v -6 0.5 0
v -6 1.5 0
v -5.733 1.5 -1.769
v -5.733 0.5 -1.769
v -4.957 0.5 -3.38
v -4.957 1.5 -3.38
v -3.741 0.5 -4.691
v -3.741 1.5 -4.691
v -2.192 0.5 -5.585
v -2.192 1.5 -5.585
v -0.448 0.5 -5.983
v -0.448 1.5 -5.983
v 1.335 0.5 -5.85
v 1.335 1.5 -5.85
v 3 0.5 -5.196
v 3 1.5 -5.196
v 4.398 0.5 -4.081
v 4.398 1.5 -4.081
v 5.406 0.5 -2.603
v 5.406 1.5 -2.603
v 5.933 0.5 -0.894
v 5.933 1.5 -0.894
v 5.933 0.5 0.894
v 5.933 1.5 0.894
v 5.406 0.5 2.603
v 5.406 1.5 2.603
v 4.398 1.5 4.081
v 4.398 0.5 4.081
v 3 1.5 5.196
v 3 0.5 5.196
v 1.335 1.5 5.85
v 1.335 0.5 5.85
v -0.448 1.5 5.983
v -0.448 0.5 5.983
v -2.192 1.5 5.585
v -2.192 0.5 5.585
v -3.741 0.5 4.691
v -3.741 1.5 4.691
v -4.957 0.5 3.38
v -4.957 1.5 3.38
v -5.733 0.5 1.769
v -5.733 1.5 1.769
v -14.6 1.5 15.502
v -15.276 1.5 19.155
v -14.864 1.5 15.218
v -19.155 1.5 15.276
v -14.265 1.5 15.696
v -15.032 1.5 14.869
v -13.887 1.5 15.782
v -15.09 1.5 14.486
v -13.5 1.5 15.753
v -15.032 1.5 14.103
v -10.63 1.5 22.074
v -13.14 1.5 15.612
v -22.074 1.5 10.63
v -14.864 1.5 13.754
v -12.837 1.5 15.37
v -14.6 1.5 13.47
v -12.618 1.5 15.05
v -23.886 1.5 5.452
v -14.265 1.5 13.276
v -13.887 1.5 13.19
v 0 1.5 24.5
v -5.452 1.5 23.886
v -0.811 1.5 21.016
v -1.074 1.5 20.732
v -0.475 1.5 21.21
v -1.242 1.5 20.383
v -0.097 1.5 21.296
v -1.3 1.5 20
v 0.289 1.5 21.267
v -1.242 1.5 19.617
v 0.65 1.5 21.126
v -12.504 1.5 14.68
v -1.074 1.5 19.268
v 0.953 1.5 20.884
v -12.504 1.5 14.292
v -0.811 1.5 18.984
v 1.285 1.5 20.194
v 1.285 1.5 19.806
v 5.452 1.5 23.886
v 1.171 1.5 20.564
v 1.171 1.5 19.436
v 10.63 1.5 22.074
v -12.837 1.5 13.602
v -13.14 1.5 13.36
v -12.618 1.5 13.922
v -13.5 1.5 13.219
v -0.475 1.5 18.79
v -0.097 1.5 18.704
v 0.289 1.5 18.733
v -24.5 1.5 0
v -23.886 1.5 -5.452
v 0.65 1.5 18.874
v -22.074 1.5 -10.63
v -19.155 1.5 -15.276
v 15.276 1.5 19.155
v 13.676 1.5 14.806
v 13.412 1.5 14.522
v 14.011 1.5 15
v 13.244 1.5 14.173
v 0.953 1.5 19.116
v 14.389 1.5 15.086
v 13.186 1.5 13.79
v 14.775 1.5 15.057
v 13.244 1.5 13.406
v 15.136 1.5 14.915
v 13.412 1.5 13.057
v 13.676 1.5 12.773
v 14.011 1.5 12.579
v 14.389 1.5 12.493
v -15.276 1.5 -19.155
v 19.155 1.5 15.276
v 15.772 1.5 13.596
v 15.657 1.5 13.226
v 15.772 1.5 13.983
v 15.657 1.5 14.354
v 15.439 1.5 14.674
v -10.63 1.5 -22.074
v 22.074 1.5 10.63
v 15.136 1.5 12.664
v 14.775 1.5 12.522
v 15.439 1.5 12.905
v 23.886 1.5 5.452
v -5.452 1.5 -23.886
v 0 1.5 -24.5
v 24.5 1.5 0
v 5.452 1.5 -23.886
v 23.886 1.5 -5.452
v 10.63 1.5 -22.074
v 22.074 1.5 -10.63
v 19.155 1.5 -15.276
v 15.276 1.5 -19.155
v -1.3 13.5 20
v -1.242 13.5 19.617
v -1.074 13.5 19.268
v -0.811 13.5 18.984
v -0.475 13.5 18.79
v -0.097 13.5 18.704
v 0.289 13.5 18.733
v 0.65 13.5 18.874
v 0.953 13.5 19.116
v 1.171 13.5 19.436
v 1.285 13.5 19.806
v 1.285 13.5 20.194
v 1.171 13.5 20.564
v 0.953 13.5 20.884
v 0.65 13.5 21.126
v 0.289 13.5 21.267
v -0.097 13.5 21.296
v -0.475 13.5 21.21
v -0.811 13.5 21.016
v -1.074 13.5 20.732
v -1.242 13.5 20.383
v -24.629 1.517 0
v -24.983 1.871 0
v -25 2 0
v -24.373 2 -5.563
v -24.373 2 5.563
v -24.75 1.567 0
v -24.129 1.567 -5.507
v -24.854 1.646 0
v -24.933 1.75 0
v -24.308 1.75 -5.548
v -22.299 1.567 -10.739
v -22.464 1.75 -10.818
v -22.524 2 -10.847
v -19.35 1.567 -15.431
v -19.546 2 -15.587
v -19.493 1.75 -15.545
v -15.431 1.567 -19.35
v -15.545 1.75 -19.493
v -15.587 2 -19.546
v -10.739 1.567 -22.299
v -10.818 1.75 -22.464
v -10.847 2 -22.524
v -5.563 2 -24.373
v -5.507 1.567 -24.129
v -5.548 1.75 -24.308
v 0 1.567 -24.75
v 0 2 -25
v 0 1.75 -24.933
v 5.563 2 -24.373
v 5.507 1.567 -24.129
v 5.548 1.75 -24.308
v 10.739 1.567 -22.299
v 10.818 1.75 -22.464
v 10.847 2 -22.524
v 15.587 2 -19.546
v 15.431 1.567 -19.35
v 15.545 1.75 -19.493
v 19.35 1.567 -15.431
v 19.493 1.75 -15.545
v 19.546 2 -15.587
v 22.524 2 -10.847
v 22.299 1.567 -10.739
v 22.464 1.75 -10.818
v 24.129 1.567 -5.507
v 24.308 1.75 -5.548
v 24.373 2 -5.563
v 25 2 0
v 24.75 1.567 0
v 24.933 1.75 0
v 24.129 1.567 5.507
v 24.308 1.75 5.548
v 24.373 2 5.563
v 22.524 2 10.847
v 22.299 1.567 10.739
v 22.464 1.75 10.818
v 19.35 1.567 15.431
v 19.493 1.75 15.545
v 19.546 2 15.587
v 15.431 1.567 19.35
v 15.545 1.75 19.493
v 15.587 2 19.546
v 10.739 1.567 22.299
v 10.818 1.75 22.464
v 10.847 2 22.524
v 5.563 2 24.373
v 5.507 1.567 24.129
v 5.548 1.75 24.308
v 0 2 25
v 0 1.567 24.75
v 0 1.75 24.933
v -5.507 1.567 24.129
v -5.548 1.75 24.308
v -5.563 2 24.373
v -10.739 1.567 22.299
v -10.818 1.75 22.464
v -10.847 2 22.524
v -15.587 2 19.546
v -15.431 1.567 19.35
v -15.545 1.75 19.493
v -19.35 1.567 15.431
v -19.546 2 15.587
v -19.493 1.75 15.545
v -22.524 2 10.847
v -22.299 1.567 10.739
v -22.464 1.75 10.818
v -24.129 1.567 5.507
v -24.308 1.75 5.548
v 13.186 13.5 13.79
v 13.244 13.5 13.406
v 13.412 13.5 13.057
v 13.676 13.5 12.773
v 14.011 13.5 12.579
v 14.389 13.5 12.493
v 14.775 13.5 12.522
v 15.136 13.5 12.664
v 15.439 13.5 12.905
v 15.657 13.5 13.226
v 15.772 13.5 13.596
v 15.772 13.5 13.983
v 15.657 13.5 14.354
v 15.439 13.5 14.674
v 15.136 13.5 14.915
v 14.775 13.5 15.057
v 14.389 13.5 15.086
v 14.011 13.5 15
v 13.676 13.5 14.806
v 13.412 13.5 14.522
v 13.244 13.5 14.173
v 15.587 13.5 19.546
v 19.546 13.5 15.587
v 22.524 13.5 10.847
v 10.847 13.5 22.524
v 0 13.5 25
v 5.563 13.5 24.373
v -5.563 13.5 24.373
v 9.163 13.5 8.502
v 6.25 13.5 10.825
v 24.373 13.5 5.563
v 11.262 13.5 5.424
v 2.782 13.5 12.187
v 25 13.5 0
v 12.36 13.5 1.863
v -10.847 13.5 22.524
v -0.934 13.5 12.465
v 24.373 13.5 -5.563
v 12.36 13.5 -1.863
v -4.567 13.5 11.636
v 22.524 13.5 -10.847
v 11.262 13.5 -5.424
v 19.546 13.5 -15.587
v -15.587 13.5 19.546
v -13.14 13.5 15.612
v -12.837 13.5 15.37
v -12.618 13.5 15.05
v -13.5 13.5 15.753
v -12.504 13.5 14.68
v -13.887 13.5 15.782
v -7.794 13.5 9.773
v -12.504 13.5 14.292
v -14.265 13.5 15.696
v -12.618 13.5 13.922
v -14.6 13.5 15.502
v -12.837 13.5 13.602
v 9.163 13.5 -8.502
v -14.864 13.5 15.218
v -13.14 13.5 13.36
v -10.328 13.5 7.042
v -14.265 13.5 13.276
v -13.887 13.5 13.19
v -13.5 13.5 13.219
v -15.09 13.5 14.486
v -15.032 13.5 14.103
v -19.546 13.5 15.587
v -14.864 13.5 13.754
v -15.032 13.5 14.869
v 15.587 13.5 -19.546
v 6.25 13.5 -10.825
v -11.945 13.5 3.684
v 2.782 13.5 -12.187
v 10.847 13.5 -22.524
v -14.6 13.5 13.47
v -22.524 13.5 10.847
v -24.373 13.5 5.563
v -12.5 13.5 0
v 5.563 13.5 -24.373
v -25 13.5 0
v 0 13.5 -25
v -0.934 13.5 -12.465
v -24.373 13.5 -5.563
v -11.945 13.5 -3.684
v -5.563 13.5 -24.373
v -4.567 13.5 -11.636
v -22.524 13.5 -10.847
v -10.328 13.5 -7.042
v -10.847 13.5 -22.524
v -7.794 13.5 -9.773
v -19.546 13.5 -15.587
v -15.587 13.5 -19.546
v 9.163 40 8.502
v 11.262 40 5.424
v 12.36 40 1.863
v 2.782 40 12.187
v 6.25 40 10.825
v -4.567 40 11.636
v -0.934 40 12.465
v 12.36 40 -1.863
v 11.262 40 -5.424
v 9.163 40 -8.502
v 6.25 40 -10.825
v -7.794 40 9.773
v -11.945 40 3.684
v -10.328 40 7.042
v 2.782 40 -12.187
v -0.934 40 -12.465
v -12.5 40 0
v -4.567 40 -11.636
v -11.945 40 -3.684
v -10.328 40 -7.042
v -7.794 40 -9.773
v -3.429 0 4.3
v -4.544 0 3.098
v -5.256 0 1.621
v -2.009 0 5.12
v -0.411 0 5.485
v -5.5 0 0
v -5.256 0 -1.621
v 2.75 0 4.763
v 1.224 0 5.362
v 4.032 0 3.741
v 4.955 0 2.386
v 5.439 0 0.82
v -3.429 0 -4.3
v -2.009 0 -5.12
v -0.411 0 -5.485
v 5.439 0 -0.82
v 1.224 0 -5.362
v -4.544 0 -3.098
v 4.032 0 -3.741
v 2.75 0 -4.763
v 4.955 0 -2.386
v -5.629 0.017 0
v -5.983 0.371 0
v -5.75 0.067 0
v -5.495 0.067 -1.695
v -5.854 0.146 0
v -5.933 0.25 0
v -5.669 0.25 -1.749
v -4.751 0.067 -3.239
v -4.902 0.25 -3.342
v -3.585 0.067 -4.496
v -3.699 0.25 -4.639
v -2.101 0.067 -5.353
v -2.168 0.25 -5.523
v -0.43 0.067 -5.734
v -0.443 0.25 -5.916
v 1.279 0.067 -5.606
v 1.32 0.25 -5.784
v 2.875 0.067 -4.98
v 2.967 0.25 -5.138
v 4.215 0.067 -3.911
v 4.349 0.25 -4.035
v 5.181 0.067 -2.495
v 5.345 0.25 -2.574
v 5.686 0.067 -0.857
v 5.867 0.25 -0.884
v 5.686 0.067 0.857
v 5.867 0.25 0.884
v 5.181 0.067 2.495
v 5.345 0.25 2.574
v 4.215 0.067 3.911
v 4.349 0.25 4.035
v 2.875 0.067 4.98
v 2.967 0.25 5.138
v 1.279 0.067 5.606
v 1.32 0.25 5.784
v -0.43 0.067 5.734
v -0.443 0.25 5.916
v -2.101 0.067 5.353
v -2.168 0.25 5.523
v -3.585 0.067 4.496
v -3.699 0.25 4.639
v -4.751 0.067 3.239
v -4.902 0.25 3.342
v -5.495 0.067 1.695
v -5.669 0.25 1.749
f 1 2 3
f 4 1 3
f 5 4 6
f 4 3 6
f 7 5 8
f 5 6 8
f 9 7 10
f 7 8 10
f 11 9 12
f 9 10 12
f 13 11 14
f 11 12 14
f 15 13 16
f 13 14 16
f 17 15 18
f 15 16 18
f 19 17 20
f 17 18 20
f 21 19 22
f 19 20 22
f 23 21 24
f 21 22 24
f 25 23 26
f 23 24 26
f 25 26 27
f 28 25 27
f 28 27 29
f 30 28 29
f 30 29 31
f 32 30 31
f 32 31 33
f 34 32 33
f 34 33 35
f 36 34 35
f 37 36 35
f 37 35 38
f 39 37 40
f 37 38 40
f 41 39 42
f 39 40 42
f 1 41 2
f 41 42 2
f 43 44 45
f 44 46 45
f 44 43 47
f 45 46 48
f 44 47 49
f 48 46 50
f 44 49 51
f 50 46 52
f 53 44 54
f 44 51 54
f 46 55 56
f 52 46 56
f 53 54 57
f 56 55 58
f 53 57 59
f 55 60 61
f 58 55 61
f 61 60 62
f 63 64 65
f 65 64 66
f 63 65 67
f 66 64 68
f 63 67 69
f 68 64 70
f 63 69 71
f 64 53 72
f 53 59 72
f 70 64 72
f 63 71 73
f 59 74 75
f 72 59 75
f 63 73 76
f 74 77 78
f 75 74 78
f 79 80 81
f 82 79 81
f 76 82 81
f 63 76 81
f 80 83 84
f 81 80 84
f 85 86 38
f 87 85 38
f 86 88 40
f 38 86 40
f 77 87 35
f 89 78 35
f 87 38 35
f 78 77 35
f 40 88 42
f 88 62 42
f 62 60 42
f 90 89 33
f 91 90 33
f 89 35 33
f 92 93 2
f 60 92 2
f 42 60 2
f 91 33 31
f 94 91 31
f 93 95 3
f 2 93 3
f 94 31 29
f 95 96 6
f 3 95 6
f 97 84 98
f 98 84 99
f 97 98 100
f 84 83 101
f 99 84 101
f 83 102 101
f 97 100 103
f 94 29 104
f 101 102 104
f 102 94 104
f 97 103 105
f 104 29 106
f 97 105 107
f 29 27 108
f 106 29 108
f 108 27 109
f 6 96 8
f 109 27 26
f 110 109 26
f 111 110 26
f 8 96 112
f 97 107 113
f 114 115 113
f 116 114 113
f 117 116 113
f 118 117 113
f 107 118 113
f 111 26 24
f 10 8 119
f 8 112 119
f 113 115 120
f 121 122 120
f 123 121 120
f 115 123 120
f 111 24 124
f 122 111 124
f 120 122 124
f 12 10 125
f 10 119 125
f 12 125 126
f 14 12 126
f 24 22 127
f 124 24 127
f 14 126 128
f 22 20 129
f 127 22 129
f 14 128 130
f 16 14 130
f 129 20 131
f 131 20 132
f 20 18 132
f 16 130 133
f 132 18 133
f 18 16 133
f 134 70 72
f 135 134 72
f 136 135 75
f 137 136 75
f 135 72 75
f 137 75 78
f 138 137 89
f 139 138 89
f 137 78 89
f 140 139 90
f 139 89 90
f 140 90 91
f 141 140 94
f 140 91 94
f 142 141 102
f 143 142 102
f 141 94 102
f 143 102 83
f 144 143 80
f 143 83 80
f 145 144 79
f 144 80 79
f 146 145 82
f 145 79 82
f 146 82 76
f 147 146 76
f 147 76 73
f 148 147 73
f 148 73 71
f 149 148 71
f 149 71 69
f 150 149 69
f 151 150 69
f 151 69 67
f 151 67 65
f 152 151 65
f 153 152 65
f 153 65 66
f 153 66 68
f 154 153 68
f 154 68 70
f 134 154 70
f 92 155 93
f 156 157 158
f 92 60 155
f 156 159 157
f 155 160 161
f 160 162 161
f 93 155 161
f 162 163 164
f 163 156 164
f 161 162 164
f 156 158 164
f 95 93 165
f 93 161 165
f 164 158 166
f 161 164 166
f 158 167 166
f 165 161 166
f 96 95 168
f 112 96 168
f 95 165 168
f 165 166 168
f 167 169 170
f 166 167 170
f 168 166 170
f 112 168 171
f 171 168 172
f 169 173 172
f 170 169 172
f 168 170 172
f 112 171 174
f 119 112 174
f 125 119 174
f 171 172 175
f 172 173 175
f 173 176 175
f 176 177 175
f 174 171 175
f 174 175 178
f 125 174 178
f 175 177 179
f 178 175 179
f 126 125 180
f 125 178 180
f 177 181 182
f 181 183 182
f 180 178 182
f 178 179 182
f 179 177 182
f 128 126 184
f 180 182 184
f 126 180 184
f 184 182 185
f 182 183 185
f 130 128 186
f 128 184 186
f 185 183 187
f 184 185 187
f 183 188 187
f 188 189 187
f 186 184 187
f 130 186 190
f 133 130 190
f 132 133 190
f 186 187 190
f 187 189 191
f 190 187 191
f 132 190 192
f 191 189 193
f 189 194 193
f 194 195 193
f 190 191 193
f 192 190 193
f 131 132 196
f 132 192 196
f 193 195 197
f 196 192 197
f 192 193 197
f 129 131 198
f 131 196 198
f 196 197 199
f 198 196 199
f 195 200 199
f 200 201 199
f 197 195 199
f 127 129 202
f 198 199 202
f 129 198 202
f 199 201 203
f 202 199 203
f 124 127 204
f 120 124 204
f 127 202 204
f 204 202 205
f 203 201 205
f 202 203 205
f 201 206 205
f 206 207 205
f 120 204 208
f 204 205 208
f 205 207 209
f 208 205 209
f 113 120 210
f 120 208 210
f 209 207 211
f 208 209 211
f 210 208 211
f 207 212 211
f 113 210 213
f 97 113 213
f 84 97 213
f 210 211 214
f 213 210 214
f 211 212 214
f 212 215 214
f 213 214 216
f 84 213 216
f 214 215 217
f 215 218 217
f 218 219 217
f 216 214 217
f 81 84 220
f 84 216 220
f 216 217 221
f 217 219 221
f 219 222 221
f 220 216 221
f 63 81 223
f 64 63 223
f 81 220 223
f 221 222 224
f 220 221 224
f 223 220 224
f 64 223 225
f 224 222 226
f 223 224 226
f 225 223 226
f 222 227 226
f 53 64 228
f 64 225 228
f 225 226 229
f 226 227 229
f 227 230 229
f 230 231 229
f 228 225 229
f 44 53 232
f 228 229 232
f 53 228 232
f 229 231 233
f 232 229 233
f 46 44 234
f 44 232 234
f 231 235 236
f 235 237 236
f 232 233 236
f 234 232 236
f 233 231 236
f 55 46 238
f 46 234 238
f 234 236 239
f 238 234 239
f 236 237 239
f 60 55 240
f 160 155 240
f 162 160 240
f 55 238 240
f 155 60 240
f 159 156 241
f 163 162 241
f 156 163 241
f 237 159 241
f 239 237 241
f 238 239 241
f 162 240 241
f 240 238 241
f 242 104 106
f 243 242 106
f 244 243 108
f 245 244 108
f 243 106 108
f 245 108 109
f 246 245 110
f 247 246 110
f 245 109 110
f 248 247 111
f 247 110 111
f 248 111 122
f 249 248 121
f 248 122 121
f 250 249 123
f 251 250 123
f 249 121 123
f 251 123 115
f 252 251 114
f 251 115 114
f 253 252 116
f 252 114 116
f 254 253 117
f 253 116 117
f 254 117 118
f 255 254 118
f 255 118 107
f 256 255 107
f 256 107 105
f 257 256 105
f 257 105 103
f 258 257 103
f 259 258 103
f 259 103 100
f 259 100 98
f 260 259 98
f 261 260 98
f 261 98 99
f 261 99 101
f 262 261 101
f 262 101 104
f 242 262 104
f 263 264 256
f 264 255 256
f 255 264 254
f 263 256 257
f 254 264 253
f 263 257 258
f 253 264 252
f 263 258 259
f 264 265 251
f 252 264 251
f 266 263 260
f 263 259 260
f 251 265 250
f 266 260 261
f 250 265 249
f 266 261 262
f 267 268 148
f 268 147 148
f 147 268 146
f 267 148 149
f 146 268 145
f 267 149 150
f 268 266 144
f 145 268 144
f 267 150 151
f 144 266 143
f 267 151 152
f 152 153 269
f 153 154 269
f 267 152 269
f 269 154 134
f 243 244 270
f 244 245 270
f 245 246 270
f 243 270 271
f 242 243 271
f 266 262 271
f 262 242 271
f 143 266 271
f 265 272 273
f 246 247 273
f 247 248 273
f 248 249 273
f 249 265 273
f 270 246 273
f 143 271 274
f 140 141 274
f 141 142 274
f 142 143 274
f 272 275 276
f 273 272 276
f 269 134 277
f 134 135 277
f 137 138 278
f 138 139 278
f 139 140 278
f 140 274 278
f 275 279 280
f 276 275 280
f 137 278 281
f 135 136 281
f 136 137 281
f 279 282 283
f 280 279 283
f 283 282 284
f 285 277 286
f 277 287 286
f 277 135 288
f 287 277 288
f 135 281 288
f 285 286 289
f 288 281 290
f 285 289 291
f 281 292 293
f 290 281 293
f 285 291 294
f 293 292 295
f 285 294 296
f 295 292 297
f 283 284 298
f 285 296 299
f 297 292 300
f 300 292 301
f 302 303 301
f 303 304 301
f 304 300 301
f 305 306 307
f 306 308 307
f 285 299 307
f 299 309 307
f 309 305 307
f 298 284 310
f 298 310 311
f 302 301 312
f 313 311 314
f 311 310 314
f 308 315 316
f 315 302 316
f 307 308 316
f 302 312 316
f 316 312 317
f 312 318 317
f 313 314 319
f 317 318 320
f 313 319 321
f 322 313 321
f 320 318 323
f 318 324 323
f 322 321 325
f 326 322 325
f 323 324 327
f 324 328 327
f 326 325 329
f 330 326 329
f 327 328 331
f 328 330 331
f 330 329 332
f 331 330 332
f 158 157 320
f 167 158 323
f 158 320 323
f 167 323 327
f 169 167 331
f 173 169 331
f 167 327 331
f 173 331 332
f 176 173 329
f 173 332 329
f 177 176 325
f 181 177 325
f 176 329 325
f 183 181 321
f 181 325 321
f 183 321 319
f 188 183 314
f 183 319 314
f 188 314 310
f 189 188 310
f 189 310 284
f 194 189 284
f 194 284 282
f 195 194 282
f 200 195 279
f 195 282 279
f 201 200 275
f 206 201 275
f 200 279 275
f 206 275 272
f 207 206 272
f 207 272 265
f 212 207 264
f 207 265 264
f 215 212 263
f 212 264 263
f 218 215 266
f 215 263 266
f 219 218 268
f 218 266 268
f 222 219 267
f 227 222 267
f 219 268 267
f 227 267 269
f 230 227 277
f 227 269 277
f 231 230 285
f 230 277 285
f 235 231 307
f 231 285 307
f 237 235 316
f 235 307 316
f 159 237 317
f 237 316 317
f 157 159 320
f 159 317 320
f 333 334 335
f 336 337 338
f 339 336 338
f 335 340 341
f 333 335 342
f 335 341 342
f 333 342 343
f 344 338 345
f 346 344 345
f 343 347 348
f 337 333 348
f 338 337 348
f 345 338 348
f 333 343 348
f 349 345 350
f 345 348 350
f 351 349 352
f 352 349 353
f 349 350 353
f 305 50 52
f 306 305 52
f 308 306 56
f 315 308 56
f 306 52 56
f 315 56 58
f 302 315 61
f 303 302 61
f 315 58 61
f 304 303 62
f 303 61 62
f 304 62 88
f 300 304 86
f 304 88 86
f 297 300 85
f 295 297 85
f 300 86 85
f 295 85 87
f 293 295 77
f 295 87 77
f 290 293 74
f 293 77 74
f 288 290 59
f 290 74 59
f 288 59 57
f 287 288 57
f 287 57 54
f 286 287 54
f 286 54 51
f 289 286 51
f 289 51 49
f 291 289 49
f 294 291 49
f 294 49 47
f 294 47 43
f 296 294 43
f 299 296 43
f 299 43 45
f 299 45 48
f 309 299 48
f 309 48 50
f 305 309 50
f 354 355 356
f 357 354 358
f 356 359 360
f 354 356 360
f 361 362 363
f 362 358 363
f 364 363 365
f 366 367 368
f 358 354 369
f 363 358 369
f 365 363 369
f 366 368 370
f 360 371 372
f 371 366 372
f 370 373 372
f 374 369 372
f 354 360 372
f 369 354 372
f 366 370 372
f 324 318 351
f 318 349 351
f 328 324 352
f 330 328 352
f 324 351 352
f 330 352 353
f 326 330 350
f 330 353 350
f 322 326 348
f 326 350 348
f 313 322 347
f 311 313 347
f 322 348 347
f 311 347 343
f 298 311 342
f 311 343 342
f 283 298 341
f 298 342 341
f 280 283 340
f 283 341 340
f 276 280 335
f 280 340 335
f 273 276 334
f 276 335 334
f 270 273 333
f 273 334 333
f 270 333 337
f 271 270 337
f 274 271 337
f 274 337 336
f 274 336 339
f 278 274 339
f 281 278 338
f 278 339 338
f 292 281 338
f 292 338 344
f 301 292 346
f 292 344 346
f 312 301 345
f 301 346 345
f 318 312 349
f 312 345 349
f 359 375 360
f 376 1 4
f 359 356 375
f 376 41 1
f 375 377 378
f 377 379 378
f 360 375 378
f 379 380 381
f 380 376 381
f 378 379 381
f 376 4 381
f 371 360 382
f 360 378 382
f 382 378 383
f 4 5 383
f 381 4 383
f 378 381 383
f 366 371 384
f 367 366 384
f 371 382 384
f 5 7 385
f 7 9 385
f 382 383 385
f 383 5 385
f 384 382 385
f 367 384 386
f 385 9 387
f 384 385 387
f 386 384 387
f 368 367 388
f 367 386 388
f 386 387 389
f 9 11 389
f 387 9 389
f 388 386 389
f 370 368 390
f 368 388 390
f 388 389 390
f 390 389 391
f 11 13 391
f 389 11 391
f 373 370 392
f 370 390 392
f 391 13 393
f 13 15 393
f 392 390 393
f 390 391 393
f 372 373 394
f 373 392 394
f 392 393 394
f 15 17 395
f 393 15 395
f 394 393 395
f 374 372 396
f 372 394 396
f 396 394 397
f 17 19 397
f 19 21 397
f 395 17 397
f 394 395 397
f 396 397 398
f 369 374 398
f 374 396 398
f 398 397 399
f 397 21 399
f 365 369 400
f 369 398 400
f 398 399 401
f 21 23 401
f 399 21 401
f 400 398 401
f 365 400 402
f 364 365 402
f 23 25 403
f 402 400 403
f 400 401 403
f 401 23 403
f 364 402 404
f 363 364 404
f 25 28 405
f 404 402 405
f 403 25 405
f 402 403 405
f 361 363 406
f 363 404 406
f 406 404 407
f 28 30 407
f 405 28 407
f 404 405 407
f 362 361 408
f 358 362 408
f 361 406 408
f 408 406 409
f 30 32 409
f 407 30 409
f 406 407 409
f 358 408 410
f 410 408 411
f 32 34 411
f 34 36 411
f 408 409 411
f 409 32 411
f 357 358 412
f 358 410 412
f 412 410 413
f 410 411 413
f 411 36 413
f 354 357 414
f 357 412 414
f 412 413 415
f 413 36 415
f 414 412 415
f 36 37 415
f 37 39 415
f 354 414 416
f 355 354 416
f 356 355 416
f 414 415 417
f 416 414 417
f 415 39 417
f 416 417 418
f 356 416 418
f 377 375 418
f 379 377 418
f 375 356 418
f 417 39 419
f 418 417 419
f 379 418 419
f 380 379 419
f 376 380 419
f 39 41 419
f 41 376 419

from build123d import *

# Parameters (mm, degrees)
FILLET2_R             = 0.5
F_1_0MM_DOWEL_HOLE1_D = 2.6


with BuildPart() as part:
    # Sketch1 → Revolve1 (revolve)
    with BuildSketch(Plane.XY, mode=Mode.PRIVATE) as revolve1_sk:
        Polygon((0, 0), (6, 0), (6, 1.5), (25, 1.5), (25, 13.5), (12.5, 13.5), (12.5, 40), (0, 40), align=None)
    revolve(revolve1_sk.sketch.rotate(Axis((0, 40, 0), (0, -1, 0)), 180), axis=Axis((0, 40, 0), (0, -1, 0)))

    # Fillet2
    fillet2_edges = [part.edges().sort_by_distance(p)[0] for p in [
        (25, 1.5, 0),
        (6, 0, 0),
    ]]
    fillet(fillet2_edges, radius=FILLET2_R)

    # Ø1.0mm Dowel Hole1 (through all)
    with Locations(Plane(origin=(0, 13.5, 0), x_dir=(1, 0, 0), z_dir=(0, 1, 0))):
        with Locations((14.486070668, -13.789624963), (0, -20), (-13.789624963, -14.486070668)):
            Hole(F_1_0MM_DOWEL_HOLE1_D / 2)


solid = part.part
